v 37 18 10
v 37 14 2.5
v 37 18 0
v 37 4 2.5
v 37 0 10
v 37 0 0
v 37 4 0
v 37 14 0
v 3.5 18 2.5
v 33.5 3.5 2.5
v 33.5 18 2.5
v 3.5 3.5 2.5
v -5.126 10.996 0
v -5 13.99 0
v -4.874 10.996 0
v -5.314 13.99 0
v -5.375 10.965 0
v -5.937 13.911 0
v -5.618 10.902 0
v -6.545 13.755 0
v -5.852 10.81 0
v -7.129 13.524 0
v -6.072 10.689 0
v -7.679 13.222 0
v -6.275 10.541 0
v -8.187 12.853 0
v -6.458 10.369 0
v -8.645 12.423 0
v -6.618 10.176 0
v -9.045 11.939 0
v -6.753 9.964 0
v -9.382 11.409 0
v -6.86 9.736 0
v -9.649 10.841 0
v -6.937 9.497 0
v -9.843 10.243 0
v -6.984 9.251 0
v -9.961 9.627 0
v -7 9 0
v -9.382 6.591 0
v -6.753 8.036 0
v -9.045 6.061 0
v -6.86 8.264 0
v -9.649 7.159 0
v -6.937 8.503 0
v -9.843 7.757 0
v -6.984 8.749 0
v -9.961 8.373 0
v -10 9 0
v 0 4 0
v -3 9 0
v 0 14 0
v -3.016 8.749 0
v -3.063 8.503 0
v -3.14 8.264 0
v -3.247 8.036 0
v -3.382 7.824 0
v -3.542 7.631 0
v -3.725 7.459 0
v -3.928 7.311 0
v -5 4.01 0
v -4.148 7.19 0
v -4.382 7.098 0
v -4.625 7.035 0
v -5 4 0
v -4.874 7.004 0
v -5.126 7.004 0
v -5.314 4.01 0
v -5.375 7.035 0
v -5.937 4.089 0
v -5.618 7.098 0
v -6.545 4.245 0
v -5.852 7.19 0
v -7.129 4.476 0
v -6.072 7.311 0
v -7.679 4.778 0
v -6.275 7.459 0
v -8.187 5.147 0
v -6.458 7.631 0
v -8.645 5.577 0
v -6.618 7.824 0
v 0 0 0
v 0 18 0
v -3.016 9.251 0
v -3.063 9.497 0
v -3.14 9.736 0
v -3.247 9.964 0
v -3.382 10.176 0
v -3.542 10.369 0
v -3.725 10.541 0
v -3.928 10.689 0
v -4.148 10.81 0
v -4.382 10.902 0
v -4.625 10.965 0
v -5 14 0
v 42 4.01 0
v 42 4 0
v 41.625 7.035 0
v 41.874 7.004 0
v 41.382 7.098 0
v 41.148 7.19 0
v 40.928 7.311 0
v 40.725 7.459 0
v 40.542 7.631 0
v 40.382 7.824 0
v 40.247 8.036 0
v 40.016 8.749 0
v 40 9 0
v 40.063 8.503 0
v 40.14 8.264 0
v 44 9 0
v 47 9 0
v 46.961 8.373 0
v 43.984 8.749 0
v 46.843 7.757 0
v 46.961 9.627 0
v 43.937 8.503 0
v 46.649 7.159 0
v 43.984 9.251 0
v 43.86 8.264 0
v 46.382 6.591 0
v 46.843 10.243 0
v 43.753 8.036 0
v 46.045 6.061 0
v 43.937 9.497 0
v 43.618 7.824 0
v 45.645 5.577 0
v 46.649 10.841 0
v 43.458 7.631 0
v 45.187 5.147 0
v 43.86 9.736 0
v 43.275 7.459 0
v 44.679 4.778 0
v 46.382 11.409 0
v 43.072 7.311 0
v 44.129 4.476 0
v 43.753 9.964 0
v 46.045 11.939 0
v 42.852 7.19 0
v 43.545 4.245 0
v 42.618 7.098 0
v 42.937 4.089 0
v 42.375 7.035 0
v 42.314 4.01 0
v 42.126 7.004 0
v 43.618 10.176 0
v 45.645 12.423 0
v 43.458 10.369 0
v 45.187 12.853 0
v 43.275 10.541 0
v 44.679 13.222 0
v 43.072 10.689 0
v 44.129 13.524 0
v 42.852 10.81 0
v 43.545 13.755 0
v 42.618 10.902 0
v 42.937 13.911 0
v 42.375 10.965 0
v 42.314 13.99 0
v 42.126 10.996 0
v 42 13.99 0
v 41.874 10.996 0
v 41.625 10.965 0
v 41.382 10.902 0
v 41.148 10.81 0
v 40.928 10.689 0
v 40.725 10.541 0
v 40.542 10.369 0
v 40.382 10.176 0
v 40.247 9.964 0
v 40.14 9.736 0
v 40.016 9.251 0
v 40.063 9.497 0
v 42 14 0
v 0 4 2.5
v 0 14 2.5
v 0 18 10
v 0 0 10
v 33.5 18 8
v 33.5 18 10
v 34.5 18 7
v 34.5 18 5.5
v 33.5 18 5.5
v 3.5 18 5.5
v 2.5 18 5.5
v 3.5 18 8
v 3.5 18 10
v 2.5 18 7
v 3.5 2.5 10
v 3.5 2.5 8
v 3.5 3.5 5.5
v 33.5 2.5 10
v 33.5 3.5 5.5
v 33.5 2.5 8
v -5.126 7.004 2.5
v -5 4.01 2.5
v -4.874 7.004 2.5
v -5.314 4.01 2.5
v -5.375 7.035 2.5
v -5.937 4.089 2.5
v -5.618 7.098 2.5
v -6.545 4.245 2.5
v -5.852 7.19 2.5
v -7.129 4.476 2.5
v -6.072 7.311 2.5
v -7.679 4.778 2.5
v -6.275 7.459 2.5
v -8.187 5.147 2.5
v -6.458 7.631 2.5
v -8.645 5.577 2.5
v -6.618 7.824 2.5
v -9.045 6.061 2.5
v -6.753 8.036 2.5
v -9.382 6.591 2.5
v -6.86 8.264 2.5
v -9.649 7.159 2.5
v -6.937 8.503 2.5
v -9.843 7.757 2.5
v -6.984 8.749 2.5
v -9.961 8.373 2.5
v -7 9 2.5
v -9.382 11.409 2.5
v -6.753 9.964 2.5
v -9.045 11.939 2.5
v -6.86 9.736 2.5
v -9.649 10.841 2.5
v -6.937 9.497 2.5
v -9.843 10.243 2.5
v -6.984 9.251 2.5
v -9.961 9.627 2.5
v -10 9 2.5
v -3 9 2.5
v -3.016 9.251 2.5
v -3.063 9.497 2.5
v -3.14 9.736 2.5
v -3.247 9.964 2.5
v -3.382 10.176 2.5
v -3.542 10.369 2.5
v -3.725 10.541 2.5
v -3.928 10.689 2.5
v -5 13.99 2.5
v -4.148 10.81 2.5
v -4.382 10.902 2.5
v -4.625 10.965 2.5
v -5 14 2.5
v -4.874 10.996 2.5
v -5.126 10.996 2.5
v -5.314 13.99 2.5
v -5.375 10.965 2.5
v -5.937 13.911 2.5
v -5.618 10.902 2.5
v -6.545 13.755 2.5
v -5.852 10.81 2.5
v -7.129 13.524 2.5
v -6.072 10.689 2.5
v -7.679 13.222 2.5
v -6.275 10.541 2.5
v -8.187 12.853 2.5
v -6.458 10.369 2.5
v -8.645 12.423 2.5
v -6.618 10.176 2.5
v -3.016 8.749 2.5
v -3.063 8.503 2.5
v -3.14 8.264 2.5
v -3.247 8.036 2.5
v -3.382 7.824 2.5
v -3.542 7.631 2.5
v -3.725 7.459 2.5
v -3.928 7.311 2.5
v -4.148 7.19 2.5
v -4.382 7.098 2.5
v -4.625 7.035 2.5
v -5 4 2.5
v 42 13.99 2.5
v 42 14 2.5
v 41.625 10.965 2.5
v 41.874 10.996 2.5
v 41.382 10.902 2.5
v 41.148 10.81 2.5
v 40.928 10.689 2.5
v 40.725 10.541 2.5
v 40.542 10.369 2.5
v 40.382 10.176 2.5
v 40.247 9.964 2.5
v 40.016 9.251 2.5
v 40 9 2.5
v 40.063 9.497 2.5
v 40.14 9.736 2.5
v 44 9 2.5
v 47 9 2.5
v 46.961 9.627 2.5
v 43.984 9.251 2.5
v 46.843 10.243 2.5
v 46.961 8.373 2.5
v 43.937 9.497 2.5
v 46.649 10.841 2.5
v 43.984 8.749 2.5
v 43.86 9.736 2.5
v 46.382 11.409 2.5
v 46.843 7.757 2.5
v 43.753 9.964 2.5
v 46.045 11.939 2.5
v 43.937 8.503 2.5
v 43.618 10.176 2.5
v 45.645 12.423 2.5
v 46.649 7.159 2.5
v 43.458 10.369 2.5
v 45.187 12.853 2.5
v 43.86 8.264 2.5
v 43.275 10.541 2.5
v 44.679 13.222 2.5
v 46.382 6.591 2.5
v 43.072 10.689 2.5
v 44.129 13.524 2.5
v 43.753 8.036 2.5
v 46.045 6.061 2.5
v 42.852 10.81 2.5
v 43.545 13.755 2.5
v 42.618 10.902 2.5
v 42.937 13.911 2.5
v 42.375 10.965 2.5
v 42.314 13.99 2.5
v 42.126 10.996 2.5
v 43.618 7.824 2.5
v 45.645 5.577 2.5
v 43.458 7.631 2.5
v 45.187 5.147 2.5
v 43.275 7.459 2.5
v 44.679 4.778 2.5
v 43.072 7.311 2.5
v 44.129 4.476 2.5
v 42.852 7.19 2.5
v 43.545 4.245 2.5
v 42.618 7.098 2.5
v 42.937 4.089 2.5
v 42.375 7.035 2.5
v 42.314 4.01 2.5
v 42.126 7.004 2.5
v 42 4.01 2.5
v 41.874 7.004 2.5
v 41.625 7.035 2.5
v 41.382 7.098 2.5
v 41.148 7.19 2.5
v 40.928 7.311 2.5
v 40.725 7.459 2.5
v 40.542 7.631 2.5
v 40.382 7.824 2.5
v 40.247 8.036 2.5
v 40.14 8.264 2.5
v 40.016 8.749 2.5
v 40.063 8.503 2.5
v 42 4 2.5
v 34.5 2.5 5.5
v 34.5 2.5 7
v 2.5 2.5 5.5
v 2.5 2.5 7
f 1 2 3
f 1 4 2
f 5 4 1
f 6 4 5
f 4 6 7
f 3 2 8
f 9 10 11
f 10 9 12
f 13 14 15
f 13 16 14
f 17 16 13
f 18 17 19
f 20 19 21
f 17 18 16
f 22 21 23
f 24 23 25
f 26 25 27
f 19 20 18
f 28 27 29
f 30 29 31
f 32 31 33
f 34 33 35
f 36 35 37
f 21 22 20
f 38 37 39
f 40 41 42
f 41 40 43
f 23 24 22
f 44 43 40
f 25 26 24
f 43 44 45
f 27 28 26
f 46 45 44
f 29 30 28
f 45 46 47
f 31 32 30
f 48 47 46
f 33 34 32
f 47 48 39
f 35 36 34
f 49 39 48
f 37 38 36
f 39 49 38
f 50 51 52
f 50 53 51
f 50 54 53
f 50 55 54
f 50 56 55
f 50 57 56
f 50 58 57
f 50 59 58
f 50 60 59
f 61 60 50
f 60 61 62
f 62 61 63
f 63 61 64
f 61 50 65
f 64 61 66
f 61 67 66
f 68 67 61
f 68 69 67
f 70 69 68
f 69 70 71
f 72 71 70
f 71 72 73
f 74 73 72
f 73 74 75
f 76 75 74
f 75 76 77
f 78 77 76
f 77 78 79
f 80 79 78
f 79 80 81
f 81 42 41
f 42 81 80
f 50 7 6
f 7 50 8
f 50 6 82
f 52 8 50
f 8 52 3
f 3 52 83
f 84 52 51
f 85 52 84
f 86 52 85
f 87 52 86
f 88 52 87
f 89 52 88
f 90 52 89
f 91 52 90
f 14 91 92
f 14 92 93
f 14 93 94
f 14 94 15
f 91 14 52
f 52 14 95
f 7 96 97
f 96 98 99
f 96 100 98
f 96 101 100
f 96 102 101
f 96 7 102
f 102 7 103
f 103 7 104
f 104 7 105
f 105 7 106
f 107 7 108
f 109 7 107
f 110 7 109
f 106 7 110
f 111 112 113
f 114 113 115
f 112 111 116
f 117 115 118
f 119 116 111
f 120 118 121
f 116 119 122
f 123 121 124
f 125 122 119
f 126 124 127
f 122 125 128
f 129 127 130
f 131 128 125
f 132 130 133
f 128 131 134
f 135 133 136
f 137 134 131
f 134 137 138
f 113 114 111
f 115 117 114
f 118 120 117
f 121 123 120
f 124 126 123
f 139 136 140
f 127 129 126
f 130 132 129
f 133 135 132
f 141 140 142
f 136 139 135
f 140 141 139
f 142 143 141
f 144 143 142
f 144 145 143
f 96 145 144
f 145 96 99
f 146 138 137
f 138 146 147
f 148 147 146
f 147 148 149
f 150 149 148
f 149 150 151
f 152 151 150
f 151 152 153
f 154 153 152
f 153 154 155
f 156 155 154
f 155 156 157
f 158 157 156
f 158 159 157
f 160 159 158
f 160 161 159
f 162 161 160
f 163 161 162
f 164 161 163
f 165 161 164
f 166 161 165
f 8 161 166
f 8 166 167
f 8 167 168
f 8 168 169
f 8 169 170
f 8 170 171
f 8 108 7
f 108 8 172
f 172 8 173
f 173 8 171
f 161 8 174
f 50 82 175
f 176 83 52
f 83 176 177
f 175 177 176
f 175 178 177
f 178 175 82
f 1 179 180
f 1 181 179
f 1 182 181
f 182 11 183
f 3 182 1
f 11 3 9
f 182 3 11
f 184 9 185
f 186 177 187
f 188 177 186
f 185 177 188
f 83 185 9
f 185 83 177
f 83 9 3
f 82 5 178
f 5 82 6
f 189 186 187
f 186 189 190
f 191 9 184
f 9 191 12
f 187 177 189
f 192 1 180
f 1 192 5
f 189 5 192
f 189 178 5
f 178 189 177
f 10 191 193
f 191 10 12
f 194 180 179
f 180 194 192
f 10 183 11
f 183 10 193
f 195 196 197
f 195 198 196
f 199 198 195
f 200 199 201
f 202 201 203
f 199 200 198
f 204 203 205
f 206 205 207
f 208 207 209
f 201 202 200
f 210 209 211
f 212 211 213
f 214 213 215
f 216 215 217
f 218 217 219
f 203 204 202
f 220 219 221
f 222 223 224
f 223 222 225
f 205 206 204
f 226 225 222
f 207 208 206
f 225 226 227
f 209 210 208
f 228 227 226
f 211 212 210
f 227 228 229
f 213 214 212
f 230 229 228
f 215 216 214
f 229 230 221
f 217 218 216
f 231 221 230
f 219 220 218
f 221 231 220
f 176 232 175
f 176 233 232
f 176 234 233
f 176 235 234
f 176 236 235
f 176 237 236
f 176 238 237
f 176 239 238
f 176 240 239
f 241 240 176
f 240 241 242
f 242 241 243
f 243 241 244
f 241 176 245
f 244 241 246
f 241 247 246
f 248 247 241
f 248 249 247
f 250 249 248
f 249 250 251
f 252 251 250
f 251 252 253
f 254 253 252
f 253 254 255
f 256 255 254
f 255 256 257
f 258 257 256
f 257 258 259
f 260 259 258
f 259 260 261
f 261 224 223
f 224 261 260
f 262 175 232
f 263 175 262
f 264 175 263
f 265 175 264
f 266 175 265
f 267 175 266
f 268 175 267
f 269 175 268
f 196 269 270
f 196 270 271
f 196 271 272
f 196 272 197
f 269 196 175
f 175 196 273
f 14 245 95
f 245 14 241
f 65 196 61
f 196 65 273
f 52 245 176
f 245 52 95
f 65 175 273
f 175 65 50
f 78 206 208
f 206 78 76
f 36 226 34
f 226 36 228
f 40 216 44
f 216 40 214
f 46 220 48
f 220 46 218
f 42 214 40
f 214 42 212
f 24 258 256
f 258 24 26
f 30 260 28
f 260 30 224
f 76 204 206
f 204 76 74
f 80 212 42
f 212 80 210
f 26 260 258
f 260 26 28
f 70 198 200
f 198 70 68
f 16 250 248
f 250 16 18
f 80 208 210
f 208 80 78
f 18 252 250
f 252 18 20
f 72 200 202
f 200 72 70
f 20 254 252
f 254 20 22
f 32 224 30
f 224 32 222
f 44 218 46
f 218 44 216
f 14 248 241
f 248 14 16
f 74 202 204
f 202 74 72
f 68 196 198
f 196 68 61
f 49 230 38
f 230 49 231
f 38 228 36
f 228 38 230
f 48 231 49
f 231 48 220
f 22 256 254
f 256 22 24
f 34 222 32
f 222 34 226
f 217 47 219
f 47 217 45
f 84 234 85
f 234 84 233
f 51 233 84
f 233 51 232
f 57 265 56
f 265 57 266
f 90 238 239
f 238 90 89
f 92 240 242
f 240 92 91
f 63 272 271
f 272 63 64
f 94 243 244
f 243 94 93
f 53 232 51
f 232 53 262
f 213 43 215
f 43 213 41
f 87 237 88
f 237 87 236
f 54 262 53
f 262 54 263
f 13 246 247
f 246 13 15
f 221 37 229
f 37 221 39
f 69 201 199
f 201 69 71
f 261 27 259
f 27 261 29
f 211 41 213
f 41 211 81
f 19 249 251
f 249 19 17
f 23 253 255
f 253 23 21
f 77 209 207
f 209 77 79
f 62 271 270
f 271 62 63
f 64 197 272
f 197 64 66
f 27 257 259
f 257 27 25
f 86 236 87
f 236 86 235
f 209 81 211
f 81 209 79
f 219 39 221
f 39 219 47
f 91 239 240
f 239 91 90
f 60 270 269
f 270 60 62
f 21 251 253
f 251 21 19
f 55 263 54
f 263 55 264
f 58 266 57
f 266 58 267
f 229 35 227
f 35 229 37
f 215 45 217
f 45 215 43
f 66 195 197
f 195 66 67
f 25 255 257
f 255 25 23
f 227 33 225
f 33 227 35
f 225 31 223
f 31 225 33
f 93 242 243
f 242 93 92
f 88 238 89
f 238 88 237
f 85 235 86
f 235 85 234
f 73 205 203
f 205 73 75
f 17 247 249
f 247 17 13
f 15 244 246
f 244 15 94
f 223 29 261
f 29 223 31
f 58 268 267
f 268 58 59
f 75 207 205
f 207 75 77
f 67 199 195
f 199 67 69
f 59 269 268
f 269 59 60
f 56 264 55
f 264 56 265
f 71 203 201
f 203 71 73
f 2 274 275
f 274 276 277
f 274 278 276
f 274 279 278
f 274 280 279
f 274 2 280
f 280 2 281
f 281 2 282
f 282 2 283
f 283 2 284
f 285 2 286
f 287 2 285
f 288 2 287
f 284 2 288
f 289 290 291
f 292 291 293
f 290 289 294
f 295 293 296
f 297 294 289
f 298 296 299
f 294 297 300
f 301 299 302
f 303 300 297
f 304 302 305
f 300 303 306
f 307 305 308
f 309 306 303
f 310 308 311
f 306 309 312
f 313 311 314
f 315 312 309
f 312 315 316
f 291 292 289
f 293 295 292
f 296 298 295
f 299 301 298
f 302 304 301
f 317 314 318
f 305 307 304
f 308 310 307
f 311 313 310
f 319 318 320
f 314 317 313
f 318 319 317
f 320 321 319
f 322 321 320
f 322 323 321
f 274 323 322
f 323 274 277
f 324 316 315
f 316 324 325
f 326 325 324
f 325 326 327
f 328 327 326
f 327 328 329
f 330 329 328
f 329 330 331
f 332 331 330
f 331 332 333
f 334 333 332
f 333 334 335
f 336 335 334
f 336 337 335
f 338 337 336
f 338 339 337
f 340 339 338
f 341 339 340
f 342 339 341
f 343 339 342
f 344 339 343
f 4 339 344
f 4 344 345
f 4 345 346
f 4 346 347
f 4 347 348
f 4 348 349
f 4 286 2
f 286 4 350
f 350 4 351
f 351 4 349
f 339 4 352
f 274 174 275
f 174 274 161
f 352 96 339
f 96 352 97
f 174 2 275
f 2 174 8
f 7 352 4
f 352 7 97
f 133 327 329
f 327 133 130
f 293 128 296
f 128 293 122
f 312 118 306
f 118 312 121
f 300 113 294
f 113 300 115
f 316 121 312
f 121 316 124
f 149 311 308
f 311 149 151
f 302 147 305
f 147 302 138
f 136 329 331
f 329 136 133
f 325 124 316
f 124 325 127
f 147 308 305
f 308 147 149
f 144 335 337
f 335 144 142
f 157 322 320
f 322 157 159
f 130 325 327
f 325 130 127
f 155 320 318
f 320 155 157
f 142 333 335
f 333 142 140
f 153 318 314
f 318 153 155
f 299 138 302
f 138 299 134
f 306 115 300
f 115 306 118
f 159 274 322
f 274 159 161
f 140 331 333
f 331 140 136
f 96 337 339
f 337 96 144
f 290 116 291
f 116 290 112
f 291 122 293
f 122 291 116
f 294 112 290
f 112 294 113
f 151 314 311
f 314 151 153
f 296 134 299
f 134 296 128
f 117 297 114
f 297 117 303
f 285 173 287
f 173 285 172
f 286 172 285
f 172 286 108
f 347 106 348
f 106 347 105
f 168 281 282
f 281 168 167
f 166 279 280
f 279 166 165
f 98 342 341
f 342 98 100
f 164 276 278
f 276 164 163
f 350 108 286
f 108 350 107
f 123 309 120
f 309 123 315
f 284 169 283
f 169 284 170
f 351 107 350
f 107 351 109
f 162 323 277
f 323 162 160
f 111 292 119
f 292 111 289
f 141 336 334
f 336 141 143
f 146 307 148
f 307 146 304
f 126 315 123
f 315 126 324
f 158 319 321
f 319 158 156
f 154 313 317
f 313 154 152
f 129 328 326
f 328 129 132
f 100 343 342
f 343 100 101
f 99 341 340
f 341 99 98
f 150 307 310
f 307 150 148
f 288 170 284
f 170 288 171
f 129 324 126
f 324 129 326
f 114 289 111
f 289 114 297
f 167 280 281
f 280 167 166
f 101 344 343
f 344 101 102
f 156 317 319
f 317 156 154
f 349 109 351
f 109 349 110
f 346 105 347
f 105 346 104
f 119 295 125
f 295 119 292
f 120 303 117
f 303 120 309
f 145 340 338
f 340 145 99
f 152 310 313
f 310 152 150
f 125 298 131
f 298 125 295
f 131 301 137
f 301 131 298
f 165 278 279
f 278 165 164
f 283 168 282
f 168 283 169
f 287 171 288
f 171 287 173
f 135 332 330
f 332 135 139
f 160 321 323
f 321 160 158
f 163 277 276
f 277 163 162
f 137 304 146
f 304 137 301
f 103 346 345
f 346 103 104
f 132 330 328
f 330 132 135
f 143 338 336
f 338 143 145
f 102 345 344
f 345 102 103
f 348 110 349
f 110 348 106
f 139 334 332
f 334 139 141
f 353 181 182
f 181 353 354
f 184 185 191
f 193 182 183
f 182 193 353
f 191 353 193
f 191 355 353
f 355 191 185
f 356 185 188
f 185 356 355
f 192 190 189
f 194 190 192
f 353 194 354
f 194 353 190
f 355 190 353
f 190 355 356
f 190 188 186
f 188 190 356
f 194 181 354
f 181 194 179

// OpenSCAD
/* bluetooth_mate_holder.scad
 * By John Biehler - November 17, 2011
 * http://www.thingiverse.com/thing: 

 * derived from pcb_box_slide_with_tabs.scad
 * By Nicholas C Lewis - Jan 1, 2011
 * http://www.thingiverse.com/thing:5396 
 *
 * derived from pcb_box_slide.scad 
 *     Parametric, open PCB-box (slide-in) by chlunde
 *     http://www.thingiverse.com/thing:4071
 *
 * CHANGES
 * - adjusted to fit Arduino Mega
 * - added mounting tabs
 * - turned off cutouts
 * - adjusted bottom cutout size
 */

$fn = 50;

//Uno is 2.7" x 2.1" which is 68.58 mm x 53.34 mm
//Round up to 69 mm x 54 mm
pcb_width = 32;
pcb_length =13;
pcb_height =1.5;
slisse = 1;

pcb_bottom_margin = 3;
wall_width_thick = 3.5;
wall_width = wall_width_thick-slisse;
box_height = 10;

//tab parameters
tab_hole_radius=2;
tab_outer_radius=5;



module tab() {
	difference(){
		union() {
			translate([-tab_outer_radius,-tab_outer_radius,0])
			cube([tab_outer_radius,2*tab_outer_radius,wall_width]);
			translate([-tab_outer_radius,0,0])
				cylinder(r=tab_outer_radius, h = wall_width);
		}
		translate([-tab_outer_radius,0,0])
		 cylinder(r= tab_hole_radius, h = wall_width+3,center=true);
	}

}

module box() {
  union() {
    cube([pcb_width + 2*wall_width, pcb_length + 2*wall_width, wall_width]);

    cube([wall_width_thick, pcb_length + 2*wall_width, box_height]);

    cube([pcb_width + 2*wall_width, wall_width_thick, box_height]);

    %translate([0, pcb_length+wall_width, 0])
      cube([pcb_width + 2*wall_width,wall_width,box_height]);

    translate([pcb_width + wall_width - slisse,0,0])
      cube([wall_width_thick, pcb_length + 2*wall_width, box_height]);
  }
//comment out this part to remove tabs
 for(i=[(pcb_length + 2*wall_width)/2]){
	translate([0,i,0])tab();
	translate([pcb_width + 2*wall_width,i,0])mirror()tab();
 }


}

module pcb() {
  translate([wall_width, wall_width, wall_width + pcb_bottom_margin])
    cube([pcb_width,pcb_length + wall_width + 0.1,pcb_height]);
  translate([wall_width, wall_width, wall_width + pcb_bottom_margin+pcb_height])rotate([0,45,0])
    cube([pcb_height,pcb_length + wall_width + 0.1,pcb_height]);
  translate([wall_width+pcb_width-2*cos(45)*pcb_height, wall_width, wall_width + pcb_bottom_margin+pcb_height])rotate([0,45,0])
    cube([pcb_height,pcb_length + wall_width + 0.1,pcb_height]);
  translate([wall_width_thick, wall_width, wall_width + pcb_bottom_margin])
    cube([pcb_width-2*slisse,pcb_length + wall_width + 0.1,box_height]);

}



module holes() {
  *translate([wall_width + pcb_width/2, wall_width_thick + 0.1, pcb_width/2+wall_width])
    rotate(a=90,v=[1,0,0])
      cylinder(r=pcb_width/2, h=wall_width_thick + 0.2);

  *translate([-0.1, wall_width + pcb_length/2, pcb_length/2 + wall_width])
    rotate(a=90,v=[0,1,0])
      cylinder(r=pcb_length/2, h=wall_width_thick + 0.2);

  *translate([pcb_width + wall_width - slisse - 0.1, wall_width + pcb_length/2, pcb_length/2 + wall_width])
    rotate(a=90,v=[0,1,0])
      cylinder(r=pcb_length/2, h=wall_width_thick + 0.2);

 * translate([pcb_width/2 + wall_width, wall_width + pcb_length/2, -0.1])
    rotate(a=0,v=[0,1,0])
      cylinder(r=min(pcb_length,pcb_width)/2 - wall_width/2, h=wall_width_thick + 0.2);
   
  inner_margin = 9;
  translate([inner_margin +wall_width, inner_margin+wall_width, -0.1])
    cube([pcb_width-inner_margin*2,pcb_length -inner_margin*2,wall_width + 0.2]);
}

difference() {
  box();
  pcb();
  holes();
}

* color([1,0,0])
  translate([pcb_width/2 + wall_width, wall_width + pcb_length/2, -0.1])
    rotate(a=0,v=[0,1,0])
      cylinder(r=min(pcb_length,pcb_width)/2 - wall_width/2, h=wall_width_thick + 0.2);
